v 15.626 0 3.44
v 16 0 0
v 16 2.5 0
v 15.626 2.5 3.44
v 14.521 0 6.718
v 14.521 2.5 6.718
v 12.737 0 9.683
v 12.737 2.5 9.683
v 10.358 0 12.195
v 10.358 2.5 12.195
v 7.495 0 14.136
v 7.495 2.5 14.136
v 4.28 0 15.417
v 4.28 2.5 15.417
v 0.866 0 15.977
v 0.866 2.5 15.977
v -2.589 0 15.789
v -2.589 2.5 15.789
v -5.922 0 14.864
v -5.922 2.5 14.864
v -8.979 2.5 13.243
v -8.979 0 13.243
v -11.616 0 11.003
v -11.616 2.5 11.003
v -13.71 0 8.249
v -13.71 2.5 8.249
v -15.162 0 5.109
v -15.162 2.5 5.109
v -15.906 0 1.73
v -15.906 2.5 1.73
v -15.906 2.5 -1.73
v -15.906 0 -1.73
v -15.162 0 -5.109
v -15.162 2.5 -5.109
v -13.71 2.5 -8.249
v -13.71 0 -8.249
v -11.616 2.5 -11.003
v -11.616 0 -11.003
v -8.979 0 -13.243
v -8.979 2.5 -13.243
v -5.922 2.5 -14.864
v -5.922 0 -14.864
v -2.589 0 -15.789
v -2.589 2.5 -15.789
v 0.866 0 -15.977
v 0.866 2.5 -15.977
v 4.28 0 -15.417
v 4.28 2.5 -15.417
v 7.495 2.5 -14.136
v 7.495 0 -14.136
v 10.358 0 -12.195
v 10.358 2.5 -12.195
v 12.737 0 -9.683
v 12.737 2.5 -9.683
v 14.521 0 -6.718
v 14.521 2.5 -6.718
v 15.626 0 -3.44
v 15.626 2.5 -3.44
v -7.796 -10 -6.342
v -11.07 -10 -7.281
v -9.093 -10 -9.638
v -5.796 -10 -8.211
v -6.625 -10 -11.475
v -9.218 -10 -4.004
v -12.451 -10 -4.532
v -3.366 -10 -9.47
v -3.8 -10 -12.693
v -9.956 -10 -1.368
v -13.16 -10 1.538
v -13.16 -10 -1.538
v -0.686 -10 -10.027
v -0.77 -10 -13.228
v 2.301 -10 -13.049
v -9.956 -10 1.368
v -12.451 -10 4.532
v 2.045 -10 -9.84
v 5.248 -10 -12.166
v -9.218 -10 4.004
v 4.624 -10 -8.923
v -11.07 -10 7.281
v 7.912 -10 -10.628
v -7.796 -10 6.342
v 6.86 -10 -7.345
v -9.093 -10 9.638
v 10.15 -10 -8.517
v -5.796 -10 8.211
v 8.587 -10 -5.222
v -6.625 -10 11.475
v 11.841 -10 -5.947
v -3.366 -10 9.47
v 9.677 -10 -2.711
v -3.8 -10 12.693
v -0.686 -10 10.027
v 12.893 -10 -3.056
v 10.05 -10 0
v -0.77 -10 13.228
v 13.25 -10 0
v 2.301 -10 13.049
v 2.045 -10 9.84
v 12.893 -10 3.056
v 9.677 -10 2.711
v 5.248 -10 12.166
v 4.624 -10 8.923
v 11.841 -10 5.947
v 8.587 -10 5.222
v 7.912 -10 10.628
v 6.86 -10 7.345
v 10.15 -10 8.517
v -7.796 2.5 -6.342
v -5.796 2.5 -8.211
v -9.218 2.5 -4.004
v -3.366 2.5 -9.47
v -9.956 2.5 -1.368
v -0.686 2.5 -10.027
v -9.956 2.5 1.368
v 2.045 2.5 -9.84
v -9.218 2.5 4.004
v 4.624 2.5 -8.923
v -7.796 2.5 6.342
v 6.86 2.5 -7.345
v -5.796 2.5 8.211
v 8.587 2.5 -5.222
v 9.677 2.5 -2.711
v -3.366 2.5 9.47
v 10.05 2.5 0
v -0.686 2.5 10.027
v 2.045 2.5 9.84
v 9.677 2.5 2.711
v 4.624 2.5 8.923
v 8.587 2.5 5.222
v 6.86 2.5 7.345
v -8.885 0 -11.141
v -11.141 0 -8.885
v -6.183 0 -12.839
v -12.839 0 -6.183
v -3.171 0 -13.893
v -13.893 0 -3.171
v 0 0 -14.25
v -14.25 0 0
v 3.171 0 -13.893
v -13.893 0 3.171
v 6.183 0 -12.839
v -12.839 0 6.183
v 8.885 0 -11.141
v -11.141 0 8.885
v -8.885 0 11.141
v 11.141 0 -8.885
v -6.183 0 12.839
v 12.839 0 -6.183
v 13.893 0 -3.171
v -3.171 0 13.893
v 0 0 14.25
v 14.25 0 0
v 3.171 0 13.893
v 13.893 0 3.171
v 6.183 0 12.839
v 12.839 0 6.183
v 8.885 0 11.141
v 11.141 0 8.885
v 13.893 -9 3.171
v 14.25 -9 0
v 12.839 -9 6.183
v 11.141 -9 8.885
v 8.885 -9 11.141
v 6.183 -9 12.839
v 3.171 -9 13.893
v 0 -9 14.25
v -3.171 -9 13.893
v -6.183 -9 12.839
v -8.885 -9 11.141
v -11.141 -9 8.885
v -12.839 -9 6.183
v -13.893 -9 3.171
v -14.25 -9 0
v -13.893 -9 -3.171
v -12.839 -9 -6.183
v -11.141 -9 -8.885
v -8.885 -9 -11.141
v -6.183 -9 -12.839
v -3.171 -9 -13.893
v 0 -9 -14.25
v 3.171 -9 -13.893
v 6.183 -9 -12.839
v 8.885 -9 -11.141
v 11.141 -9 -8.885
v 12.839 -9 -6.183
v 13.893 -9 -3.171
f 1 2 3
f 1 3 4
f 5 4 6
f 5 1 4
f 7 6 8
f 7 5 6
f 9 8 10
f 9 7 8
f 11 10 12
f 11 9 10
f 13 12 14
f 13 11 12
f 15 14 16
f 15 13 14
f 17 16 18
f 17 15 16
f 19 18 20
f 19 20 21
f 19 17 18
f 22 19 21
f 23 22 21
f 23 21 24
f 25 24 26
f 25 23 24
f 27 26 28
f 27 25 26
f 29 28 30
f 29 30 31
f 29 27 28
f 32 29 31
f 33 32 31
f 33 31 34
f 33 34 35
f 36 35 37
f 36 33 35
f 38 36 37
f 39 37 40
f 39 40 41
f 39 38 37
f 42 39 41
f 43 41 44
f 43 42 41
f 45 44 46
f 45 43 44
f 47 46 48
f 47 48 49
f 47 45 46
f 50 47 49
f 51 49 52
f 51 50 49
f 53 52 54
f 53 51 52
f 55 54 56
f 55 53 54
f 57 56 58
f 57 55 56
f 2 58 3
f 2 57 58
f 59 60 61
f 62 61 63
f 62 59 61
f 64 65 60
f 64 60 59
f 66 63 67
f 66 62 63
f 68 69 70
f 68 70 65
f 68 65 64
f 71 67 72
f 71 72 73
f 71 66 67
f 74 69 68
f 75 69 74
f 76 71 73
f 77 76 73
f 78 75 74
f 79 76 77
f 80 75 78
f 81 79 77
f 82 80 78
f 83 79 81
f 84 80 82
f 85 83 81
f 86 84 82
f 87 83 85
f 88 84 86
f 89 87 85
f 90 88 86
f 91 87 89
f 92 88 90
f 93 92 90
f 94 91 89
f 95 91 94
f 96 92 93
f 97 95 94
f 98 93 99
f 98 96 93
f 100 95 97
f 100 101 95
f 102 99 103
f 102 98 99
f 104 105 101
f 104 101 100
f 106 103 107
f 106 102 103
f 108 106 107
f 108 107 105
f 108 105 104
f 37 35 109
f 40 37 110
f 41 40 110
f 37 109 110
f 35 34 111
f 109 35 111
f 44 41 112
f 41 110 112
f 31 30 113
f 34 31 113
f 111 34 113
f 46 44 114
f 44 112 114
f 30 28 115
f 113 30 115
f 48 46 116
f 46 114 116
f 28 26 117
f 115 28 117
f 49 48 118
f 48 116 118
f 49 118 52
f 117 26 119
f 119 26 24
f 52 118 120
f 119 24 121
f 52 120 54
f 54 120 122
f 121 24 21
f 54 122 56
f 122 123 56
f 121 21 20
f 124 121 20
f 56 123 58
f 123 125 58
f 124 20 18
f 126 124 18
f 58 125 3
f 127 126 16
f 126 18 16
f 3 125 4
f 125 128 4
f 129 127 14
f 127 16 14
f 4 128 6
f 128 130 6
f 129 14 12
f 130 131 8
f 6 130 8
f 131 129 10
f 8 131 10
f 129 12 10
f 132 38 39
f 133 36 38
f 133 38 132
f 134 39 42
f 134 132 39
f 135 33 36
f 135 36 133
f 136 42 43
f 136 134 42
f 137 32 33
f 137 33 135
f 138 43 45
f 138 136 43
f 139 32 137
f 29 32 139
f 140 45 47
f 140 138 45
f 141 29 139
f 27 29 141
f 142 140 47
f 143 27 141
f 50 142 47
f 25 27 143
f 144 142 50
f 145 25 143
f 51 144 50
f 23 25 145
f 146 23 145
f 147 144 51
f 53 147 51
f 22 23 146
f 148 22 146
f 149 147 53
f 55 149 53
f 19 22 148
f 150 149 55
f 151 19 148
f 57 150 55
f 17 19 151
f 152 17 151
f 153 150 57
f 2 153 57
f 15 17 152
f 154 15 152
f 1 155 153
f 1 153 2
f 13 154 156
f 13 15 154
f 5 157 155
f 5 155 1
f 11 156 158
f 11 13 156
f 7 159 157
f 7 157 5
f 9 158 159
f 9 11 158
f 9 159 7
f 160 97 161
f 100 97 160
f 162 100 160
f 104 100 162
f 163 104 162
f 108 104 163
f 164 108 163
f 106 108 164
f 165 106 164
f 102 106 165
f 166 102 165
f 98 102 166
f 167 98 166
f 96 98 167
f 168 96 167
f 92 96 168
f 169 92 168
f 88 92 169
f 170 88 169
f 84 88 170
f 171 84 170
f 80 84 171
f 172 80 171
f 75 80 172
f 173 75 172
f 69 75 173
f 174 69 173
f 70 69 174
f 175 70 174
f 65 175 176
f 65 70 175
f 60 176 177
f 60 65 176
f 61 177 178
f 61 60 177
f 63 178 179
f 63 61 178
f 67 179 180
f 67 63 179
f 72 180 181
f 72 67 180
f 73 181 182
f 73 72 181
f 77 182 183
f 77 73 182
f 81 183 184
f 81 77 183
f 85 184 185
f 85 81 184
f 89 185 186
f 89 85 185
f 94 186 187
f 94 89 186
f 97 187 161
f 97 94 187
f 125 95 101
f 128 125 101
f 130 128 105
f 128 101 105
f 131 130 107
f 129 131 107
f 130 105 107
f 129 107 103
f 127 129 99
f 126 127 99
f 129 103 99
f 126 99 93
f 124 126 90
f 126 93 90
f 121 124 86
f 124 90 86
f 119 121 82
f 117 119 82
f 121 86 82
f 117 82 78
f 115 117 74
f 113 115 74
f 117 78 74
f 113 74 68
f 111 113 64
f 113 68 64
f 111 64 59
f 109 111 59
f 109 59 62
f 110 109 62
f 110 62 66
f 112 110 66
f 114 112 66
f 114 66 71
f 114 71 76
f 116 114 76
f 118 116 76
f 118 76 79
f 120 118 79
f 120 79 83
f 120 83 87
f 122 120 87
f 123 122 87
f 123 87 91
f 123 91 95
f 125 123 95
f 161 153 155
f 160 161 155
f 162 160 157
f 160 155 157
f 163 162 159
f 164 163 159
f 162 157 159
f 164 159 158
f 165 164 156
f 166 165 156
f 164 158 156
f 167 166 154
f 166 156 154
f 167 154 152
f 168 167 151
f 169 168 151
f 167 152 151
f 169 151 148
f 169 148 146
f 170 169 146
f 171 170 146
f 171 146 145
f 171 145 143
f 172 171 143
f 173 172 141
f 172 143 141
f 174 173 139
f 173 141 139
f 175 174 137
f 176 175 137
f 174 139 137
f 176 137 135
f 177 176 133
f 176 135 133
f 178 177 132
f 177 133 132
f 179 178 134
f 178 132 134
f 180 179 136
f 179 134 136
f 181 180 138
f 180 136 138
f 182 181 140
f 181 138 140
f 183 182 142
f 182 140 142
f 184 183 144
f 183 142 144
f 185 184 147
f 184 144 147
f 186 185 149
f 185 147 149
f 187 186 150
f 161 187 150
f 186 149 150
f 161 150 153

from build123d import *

# Parameters (mm, degrees)
F0_R     = 14.25
F1_DEPTH = 10
F2_R     = 16
F3_DEPTH = 2.5
F4_SIZE  = 1
F5_R     = 10.05
F6_DEPTH = 15


with BuildPart() as f1:
    # F0 (on Front) → F1 (new body)
    with BuildSketch(Plane.XZ):
        Circle(F0_R)
    extrude(amount=F1_DEPTH)

    # F2 (on Front) → F3 (join)
    with BuildSketch(Plane.XZ):
        Circle(F2_R)
    extrude(amount=-F3_DEPTH)

    # F4
    f4_edges = [f1.edges().sort_by_distance(p)[0] for p in [
        (-14.25, -10, 0),
    ]]
    chamfer(f4_edges, length=F4_SIZE)

    # F5 (on face) → F6 (cut)
    with BuildSketch(Plane.XZ.offset(10)):
        Circle(F5_R)
    extrude(amount=-F6_DEPTH, mode=Mode.SUBTRACT)


solid = f1.part
